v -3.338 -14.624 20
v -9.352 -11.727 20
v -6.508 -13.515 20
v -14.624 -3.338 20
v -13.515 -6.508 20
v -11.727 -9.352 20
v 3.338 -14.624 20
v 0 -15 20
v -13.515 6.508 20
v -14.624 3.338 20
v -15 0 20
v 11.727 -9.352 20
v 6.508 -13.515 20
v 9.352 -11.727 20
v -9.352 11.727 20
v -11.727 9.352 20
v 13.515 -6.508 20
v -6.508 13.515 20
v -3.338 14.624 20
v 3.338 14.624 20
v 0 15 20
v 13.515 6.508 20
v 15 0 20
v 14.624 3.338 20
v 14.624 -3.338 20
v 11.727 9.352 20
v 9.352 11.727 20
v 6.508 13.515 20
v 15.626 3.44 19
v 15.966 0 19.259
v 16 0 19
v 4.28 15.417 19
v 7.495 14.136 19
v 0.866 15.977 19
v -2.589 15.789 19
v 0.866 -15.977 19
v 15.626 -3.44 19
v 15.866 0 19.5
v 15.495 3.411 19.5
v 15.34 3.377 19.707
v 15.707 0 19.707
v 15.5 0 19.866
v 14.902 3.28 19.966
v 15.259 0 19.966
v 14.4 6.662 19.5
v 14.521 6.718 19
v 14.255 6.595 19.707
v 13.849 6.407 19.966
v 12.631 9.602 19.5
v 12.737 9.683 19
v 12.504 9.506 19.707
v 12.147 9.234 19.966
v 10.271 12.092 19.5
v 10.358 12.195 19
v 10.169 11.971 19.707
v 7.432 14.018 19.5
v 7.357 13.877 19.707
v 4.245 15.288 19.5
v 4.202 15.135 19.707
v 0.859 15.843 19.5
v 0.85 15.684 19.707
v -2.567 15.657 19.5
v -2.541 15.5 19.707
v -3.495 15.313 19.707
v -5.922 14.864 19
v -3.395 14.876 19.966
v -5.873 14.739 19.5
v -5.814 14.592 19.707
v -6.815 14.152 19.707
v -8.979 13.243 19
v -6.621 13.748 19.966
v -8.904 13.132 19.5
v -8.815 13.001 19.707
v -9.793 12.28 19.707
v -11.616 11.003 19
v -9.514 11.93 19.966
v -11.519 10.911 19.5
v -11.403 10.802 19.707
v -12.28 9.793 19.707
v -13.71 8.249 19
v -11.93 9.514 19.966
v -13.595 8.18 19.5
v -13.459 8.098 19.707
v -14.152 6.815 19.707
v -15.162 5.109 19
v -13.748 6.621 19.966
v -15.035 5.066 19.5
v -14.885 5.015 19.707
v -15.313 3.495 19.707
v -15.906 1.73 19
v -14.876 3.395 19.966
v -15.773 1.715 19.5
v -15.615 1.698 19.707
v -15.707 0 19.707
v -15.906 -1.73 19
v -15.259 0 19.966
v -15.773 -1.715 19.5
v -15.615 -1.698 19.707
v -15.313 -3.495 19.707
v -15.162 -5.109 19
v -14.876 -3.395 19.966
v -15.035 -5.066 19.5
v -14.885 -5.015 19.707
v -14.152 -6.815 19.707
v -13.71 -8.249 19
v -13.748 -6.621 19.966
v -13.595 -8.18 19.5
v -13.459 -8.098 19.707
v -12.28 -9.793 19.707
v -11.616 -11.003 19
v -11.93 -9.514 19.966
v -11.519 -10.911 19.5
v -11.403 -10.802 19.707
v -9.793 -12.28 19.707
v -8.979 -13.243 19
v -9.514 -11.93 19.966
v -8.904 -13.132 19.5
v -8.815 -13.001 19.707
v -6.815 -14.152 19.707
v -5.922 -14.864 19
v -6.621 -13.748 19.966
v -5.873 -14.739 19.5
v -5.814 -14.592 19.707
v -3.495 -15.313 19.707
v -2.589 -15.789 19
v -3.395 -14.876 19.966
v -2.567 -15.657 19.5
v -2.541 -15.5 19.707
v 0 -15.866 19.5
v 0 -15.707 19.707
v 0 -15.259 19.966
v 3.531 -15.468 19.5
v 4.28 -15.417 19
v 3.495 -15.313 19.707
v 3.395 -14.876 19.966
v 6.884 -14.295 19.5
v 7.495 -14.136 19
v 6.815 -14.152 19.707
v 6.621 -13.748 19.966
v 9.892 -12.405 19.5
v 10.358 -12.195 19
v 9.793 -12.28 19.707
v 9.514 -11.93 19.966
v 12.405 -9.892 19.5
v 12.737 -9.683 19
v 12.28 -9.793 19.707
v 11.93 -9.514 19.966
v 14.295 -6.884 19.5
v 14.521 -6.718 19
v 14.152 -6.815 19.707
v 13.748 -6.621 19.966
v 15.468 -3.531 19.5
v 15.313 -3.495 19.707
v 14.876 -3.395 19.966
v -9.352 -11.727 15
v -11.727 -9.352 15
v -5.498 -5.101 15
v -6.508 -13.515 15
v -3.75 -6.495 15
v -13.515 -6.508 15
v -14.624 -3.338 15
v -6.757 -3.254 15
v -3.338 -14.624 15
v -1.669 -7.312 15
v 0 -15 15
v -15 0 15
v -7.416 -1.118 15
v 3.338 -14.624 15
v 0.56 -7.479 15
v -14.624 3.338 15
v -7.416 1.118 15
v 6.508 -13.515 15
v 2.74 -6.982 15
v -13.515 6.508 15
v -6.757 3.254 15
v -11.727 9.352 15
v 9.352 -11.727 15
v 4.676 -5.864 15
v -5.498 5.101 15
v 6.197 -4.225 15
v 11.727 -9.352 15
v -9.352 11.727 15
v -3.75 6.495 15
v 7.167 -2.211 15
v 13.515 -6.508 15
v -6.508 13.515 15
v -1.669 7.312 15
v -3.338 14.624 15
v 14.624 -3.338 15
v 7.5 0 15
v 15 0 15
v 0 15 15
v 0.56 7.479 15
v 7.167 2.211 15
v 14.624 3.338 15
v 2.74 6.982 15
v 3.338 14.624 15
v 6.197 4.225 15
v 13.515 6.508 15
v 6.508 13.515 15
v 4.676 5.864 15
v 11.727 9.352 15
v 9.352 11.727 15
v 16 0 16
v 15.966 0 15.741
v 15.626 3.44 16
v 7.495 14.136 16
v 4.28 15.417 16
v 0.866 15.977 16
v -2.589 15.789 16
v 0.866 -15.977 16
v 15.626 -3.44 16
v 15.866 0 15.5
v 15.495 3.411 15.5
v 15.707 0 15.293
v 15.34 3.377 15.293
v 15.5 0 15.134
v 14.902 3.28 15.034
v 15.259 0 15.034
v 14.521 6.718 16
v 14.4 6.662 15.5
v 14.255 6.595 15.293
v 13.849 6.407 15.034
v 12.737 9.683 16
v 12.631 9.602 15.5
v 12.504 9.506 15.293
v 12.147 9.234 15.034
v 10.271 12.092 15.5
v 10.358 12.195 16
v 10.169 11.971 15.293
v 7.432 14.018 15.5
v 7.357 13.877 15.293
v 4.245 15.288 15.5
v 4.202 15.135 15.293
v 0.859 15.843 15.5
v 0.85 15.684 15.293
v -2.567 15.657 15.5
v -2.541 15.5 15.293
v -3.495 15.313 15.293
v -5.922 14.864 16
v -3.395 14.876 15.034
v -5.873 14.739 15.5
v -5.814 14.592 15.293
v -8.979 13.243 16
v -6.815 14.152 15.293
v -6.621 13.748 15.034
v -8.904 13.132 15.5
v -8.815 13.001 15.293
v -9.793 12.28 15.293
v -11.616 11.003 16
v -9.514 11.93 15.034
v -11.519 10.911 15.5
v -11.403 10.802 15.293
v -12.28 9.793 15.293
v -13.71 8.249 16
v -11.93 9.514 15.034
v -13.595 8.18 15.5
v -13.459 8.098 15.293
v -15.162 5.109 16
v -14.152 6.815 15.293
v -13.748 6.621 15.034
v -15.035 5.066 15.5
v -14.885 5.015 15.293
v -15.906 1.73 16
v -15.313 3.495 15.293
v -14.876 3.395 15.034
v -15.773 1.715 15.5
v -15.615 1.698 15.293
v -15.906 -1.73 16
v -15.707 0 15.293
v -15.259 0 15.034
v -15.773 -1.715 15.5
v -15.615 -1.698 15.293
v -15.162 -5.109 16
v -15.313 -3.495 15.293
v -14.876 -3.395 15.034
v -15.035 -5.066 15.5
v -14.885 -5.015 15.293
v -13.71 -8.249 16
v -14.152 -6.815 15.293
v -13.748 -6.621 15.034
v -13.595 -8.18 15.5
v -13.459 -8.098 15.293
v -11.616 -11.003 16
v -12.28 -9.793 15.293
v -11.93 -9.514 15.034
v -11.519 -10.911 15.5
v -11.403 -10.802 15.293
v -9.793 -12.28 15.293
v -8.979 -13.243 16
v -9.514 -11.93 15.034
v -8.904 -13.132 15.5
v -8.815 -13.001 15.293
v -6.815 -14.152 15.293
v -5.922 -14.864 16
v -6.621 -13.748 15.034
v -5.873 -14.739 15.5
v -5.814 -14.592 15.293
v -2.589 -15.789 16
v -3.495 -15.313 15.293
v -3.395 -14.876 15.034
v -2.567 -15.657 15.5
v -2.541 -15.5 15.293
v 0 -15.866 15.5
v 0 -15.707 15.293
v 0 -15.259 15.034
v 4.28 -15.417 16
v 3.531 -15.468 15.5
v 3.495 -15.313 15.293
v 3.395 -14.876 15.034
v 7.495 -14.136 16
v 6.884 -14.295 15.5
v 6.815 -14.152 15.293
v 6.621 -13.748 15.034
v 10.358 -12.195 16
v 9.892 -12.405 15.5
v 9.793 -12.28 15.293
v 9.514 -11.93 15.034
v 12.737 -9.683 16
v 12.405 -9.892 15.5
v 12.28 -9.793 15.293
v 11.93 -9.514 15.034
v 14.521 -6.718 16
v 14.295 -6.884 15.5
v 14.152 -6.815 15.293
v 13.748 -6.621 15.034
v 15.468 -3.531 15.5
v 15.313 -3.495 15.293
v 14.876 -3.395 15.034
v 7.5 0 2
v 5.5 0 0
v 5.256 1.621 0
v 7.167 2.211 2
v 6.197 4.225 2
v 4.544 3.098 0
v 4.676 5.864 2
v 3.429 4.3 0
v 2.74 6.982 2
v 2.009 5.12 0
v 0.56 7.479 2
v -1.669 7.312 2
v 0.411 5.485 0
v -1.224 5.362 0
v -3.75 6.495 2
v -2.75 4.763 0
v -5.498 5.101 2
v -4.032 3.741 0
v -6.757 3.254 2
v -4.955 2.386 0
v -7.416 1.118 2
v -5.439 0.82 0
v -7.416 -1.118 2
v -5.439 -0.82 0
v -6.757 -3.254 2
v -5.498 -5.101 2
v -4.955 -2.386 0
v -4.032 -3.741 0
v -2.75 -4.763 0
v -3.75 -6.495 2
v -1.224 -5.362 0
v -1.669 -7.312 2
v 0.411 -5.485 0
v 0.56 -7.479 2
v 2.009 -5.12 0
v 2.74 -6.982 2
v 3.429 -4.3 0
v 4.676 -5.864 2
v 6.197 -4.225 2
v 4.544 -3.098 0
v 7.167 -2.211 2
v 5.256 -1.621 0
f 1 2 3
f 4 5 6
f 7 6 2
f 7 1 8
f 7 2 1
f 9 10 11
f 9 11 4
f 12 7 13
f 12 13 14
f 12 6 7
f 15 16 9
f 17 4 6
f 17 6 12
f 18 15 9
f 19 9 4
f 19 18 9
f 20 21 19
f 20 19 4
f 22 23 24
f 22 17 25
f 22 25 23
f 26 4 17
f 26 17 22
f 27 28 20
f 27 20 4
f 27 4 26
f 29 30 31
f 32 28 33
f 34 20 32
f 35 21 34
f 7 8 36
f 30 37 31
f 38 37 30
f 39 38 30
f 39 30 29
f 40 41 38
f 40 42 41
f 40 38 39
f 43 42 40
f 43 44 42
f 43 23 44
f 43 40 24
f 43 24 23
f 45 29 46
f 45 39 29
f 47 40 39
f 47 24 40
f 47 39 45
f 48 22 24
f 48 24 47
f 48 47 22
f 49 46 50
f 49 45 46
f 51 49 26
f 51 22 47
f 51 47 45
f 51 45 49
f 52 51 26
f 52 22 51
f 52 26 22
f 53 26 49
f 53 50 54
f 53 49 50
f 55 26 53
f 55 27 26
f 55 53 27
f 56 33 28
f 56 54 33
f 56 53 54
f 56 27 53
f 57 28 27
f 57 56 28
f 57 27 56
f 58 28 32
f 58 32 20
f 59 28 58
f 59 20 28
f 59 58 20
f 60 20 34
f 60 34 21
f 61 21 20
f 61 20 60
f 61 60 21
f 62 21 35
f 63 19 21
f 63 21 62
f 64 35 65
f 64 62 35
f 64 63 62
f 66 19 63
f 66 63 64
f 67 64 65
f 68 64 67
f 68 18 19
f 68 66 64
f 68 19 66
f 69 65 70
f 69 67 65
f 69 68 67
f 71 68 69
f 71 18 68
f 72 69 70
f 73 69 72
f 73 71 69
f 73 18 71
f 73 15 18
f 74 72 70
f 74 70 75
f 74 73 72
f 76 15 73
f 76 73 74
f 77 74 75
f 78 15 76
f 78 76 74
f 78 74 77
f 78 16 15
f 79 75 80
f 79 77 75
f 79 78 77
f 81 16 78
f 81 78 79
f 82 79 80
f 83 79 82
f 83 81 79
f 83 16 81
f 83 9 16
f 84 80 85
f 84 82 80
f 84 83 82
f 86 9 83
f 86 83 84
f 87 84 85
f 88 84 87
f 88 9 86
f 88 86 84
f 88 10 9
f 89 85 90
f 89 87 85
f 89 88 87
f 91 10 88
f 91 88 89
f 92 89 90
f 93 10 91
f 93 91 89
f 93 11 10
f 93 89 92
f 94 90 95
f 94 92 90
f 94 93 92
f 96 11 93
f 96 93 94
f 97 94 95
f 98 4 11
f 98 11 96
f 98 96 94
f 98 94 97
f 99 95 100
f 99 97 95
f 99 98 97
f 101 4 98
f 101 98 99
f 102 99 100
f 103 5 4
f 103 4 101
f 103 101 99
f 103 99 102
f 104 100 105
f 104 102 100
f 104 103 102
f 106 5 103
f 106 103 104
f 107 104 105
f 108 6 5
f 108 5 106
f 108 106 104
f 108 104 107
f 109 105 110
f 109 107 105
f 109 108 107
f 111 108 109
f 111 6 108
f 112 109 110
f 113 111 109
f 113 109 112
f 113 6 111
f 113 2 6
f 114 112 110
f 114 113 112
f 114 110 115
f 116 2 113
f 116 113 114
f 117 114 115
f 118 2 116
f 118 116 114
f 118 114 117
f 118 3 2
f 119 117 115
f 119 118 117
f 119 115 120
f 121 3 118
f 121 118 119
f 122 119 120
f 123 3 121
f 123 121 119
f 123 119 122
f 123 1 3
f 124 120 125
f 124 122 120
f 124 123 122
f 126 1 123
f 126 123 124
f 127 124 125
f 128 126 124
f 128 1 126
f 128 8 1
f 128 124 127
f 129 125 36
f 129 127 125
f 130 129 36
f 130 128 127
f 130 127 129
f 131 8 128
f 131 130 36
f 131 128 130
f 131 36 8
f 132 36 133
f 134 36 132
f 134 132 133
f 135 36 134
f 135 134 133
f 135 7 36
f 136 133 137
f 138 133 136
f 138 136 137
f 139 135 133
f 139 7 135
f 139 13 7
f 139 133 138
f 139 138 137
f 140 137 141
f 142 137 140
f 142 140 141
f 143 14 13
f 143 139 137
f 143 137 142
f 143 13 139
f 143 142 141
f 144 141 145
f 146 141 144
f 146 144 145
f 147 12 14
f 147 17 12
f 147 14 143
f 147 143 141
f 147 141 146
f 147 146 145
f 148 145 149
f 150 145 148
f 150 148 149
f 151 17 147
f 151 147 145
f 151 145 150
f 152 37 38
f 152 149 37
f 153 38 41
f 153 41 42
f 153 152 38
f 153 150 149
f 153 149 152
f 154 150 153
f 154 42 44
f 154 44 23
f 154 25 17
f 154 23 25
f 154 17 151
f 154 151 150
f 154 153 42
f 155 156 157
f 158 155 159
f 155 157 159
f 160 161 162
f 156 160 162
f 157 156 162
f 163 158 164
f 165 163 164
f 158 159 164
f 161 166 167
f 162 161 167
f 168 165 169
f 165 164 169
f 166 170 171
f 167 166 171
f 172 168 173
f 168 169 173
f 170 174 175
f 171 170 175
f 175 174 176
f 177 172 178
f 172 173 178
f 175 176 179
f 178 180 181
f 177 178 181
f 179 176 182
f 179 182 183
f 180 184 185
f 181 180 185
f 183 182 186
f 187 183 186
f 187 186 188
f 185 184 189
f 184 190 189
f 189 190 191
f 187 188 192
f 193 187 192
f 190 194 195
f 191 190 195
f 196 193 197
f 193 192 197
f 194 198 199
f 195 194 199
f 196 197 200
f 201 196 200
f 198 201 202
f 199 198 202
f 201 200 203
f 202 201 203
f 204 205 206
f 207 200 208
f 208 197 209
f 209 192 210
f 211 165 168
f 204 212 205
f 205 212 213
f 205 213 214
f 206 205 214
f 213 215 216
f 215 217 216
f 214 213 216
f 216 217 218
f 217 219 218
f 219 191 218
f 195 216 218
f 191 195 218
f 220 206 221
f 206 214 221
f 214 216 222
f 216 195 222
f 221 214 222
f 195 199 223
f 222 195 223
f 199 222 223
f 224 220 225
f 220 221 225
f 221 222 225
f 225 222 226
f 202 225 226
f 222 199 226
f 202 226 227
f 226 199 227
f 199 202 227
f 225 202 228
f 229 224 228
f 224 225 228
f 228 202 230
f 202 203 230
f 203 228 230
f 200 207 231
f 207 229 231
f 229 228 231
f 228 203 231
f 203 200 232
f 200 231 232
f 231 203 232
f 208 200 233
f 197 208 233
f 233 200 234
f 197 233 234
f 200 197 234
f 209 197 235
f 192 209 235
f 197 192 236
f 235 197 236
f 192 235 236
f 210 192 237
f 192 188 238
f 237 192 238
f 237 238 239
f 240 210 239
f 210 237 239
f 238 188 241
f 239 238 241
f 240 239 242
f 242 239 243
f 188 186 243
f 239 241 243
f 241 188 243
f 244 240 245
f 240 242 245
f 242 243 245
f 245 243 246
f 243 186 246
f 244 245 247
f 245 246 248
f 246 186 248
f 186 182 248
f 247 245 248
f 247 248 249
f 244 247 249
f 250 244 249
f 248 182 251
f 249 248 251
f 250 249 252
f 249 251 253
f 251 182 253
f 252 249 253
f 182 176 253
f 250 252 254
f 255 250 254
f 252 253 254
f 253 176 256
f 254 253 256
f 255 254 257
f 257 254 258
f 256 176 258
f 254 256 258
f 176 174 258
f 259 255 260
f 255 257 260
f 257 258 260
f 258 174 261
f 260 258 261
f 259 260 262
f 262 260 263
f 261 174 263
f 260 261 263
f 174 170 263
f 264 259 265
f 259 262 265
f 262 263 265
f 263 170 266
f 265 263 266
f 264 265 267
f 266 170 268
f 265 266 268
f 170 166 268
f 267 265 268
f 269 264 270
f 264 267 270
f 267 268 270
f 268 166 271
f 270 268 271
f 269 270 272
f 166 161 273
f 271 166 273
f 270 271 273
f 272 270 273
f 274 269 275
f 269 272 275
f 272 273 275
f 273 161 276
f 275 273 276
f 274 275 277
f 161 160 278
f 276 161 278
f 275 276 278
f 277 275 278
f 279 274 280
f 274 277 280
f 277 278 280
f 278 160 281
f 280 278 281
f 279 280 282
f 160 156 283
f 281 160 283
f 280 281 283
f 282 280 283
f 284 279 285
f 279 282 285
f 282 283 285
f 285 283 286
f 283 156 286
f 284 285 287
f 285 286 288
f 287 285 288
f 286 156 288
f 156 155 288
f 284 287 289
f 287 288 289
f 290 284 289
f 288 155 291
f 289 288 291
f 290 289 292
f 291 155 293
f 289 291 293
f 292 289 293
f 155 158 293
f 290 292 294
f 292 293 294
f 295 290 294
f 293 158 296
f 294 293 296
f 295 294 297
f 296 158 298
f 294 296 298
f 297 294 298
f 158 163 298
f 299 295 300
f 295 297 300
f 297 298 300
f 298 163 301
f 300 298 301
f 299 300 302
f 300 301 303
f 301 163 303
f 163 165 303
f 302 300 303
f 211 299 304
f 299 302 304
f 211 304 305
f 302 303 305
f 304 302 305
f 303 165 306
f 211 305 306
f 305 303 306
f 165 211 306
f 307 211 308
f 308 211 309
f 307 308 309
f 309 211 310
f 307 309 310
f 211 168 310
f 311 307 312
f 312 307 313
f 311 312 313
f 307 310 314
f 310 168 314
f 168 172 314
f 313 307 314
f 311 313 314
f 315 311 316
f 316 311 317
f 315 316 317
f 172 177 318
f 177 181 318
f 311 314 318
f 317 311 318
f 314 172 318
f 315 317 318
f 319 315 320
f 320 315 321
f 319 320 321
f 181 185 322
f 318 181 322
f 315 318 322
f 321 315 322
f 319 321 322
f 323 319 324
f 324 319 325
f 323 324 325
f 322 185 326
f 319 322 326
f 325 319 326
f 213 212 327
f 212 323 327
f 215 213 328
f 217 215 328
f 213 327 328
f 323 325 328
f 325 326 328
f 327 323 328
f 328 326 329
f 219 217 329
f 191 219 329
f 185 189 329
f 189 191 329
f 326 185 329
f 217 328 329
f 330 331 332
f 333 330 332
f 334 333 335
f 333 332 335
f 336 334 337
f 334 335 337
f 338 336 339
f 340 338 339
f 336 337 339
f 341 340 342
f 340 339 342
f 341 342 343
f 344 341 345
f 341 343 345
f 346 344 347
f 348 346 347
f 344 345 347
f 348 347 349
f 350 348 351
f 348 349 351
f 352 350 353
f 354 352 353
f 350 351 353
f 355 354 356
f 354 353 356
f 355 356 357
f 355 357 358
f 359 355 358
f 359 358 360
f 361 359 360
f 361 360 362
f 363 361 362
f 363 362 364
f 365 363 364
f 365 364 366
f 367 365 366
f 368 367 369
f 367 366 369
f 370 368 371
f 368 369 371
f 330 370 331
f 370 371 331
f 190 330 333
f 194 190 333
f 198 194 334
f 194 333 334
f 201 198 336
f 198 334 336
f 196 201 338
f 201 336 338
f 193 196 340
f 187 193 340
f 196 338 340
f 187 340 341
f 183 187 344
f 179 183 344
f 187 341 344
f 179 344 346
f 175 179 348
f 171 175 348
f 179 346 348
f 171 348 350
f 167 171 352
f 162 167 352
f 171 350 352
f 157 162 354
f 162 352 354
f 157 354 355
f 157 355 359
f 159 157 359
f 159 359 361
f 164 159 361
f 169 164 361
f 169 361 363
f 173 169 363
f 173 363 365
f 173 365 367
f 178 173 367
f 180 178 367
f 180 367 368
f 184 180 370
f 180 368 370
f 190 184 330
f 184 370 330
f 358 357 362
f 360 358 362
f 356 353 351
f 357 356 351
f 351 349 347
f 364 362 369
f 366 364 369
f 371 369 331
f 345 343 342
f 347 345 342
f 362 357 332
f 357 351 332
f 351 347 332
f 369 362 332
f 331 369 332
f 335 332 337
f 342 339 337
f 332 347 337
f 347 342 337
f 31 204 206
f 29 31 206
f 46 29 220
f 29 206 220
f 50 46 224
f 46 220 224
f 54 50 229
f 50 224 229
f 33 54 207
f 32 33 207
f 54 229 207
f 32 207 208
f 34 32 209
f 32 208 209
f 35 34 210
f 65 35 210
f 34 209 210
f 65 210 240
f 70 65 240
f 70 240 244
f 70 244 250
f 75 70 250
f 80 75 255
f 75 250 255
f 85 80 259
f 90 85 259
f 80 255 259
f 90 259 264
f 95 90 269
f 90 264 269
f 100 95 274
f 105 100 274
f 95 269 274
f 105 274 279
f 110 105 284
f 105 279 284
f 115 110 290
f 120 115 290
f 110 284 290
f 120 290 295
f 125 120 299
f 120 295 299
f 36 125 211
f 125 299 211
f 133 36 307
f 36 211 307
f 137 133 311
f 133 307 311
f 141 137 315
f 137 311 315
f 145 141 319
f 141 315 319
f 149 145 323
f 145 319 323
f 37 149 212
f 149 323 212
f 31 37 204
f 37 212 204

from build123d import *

# Parameters (mm, degrees)
F0_R     = 7.5
F1_DEPTH = 15
F2_R     = 16
F3_DEPTH = 5
F4_R     = 1
F5_SIZE  = 2


with BuildPart() as f1:
    # F0 (on Top) → F1 (new body)
    with BuildSketch(Plane.XY):
        Circle(F0_R)
    extrude(amount=F1_DEPTH)

    # F2 (on face) → F3 (join)
    with BuildSketch(Plane.XY.offset(15)):
        Circle(F2_R)
    extrude(amount=F3_DEPTH)

    # F4
    f4_edges = [f1.edges().sort_by_distance(p)[0] for p in [
        (-16, 0, 20),
        (-16, 0, 15),
    ]]
    fillet(f4_edges, radius=F4_R)

    # F5
    f5_edges = [f1.edges().sort_by_distance(p)[0] for p in [
        (-7.5, 0, 0),
    ]]
    chamfer(f5_edges, length=F5_SIZE)


solid = f1.part
